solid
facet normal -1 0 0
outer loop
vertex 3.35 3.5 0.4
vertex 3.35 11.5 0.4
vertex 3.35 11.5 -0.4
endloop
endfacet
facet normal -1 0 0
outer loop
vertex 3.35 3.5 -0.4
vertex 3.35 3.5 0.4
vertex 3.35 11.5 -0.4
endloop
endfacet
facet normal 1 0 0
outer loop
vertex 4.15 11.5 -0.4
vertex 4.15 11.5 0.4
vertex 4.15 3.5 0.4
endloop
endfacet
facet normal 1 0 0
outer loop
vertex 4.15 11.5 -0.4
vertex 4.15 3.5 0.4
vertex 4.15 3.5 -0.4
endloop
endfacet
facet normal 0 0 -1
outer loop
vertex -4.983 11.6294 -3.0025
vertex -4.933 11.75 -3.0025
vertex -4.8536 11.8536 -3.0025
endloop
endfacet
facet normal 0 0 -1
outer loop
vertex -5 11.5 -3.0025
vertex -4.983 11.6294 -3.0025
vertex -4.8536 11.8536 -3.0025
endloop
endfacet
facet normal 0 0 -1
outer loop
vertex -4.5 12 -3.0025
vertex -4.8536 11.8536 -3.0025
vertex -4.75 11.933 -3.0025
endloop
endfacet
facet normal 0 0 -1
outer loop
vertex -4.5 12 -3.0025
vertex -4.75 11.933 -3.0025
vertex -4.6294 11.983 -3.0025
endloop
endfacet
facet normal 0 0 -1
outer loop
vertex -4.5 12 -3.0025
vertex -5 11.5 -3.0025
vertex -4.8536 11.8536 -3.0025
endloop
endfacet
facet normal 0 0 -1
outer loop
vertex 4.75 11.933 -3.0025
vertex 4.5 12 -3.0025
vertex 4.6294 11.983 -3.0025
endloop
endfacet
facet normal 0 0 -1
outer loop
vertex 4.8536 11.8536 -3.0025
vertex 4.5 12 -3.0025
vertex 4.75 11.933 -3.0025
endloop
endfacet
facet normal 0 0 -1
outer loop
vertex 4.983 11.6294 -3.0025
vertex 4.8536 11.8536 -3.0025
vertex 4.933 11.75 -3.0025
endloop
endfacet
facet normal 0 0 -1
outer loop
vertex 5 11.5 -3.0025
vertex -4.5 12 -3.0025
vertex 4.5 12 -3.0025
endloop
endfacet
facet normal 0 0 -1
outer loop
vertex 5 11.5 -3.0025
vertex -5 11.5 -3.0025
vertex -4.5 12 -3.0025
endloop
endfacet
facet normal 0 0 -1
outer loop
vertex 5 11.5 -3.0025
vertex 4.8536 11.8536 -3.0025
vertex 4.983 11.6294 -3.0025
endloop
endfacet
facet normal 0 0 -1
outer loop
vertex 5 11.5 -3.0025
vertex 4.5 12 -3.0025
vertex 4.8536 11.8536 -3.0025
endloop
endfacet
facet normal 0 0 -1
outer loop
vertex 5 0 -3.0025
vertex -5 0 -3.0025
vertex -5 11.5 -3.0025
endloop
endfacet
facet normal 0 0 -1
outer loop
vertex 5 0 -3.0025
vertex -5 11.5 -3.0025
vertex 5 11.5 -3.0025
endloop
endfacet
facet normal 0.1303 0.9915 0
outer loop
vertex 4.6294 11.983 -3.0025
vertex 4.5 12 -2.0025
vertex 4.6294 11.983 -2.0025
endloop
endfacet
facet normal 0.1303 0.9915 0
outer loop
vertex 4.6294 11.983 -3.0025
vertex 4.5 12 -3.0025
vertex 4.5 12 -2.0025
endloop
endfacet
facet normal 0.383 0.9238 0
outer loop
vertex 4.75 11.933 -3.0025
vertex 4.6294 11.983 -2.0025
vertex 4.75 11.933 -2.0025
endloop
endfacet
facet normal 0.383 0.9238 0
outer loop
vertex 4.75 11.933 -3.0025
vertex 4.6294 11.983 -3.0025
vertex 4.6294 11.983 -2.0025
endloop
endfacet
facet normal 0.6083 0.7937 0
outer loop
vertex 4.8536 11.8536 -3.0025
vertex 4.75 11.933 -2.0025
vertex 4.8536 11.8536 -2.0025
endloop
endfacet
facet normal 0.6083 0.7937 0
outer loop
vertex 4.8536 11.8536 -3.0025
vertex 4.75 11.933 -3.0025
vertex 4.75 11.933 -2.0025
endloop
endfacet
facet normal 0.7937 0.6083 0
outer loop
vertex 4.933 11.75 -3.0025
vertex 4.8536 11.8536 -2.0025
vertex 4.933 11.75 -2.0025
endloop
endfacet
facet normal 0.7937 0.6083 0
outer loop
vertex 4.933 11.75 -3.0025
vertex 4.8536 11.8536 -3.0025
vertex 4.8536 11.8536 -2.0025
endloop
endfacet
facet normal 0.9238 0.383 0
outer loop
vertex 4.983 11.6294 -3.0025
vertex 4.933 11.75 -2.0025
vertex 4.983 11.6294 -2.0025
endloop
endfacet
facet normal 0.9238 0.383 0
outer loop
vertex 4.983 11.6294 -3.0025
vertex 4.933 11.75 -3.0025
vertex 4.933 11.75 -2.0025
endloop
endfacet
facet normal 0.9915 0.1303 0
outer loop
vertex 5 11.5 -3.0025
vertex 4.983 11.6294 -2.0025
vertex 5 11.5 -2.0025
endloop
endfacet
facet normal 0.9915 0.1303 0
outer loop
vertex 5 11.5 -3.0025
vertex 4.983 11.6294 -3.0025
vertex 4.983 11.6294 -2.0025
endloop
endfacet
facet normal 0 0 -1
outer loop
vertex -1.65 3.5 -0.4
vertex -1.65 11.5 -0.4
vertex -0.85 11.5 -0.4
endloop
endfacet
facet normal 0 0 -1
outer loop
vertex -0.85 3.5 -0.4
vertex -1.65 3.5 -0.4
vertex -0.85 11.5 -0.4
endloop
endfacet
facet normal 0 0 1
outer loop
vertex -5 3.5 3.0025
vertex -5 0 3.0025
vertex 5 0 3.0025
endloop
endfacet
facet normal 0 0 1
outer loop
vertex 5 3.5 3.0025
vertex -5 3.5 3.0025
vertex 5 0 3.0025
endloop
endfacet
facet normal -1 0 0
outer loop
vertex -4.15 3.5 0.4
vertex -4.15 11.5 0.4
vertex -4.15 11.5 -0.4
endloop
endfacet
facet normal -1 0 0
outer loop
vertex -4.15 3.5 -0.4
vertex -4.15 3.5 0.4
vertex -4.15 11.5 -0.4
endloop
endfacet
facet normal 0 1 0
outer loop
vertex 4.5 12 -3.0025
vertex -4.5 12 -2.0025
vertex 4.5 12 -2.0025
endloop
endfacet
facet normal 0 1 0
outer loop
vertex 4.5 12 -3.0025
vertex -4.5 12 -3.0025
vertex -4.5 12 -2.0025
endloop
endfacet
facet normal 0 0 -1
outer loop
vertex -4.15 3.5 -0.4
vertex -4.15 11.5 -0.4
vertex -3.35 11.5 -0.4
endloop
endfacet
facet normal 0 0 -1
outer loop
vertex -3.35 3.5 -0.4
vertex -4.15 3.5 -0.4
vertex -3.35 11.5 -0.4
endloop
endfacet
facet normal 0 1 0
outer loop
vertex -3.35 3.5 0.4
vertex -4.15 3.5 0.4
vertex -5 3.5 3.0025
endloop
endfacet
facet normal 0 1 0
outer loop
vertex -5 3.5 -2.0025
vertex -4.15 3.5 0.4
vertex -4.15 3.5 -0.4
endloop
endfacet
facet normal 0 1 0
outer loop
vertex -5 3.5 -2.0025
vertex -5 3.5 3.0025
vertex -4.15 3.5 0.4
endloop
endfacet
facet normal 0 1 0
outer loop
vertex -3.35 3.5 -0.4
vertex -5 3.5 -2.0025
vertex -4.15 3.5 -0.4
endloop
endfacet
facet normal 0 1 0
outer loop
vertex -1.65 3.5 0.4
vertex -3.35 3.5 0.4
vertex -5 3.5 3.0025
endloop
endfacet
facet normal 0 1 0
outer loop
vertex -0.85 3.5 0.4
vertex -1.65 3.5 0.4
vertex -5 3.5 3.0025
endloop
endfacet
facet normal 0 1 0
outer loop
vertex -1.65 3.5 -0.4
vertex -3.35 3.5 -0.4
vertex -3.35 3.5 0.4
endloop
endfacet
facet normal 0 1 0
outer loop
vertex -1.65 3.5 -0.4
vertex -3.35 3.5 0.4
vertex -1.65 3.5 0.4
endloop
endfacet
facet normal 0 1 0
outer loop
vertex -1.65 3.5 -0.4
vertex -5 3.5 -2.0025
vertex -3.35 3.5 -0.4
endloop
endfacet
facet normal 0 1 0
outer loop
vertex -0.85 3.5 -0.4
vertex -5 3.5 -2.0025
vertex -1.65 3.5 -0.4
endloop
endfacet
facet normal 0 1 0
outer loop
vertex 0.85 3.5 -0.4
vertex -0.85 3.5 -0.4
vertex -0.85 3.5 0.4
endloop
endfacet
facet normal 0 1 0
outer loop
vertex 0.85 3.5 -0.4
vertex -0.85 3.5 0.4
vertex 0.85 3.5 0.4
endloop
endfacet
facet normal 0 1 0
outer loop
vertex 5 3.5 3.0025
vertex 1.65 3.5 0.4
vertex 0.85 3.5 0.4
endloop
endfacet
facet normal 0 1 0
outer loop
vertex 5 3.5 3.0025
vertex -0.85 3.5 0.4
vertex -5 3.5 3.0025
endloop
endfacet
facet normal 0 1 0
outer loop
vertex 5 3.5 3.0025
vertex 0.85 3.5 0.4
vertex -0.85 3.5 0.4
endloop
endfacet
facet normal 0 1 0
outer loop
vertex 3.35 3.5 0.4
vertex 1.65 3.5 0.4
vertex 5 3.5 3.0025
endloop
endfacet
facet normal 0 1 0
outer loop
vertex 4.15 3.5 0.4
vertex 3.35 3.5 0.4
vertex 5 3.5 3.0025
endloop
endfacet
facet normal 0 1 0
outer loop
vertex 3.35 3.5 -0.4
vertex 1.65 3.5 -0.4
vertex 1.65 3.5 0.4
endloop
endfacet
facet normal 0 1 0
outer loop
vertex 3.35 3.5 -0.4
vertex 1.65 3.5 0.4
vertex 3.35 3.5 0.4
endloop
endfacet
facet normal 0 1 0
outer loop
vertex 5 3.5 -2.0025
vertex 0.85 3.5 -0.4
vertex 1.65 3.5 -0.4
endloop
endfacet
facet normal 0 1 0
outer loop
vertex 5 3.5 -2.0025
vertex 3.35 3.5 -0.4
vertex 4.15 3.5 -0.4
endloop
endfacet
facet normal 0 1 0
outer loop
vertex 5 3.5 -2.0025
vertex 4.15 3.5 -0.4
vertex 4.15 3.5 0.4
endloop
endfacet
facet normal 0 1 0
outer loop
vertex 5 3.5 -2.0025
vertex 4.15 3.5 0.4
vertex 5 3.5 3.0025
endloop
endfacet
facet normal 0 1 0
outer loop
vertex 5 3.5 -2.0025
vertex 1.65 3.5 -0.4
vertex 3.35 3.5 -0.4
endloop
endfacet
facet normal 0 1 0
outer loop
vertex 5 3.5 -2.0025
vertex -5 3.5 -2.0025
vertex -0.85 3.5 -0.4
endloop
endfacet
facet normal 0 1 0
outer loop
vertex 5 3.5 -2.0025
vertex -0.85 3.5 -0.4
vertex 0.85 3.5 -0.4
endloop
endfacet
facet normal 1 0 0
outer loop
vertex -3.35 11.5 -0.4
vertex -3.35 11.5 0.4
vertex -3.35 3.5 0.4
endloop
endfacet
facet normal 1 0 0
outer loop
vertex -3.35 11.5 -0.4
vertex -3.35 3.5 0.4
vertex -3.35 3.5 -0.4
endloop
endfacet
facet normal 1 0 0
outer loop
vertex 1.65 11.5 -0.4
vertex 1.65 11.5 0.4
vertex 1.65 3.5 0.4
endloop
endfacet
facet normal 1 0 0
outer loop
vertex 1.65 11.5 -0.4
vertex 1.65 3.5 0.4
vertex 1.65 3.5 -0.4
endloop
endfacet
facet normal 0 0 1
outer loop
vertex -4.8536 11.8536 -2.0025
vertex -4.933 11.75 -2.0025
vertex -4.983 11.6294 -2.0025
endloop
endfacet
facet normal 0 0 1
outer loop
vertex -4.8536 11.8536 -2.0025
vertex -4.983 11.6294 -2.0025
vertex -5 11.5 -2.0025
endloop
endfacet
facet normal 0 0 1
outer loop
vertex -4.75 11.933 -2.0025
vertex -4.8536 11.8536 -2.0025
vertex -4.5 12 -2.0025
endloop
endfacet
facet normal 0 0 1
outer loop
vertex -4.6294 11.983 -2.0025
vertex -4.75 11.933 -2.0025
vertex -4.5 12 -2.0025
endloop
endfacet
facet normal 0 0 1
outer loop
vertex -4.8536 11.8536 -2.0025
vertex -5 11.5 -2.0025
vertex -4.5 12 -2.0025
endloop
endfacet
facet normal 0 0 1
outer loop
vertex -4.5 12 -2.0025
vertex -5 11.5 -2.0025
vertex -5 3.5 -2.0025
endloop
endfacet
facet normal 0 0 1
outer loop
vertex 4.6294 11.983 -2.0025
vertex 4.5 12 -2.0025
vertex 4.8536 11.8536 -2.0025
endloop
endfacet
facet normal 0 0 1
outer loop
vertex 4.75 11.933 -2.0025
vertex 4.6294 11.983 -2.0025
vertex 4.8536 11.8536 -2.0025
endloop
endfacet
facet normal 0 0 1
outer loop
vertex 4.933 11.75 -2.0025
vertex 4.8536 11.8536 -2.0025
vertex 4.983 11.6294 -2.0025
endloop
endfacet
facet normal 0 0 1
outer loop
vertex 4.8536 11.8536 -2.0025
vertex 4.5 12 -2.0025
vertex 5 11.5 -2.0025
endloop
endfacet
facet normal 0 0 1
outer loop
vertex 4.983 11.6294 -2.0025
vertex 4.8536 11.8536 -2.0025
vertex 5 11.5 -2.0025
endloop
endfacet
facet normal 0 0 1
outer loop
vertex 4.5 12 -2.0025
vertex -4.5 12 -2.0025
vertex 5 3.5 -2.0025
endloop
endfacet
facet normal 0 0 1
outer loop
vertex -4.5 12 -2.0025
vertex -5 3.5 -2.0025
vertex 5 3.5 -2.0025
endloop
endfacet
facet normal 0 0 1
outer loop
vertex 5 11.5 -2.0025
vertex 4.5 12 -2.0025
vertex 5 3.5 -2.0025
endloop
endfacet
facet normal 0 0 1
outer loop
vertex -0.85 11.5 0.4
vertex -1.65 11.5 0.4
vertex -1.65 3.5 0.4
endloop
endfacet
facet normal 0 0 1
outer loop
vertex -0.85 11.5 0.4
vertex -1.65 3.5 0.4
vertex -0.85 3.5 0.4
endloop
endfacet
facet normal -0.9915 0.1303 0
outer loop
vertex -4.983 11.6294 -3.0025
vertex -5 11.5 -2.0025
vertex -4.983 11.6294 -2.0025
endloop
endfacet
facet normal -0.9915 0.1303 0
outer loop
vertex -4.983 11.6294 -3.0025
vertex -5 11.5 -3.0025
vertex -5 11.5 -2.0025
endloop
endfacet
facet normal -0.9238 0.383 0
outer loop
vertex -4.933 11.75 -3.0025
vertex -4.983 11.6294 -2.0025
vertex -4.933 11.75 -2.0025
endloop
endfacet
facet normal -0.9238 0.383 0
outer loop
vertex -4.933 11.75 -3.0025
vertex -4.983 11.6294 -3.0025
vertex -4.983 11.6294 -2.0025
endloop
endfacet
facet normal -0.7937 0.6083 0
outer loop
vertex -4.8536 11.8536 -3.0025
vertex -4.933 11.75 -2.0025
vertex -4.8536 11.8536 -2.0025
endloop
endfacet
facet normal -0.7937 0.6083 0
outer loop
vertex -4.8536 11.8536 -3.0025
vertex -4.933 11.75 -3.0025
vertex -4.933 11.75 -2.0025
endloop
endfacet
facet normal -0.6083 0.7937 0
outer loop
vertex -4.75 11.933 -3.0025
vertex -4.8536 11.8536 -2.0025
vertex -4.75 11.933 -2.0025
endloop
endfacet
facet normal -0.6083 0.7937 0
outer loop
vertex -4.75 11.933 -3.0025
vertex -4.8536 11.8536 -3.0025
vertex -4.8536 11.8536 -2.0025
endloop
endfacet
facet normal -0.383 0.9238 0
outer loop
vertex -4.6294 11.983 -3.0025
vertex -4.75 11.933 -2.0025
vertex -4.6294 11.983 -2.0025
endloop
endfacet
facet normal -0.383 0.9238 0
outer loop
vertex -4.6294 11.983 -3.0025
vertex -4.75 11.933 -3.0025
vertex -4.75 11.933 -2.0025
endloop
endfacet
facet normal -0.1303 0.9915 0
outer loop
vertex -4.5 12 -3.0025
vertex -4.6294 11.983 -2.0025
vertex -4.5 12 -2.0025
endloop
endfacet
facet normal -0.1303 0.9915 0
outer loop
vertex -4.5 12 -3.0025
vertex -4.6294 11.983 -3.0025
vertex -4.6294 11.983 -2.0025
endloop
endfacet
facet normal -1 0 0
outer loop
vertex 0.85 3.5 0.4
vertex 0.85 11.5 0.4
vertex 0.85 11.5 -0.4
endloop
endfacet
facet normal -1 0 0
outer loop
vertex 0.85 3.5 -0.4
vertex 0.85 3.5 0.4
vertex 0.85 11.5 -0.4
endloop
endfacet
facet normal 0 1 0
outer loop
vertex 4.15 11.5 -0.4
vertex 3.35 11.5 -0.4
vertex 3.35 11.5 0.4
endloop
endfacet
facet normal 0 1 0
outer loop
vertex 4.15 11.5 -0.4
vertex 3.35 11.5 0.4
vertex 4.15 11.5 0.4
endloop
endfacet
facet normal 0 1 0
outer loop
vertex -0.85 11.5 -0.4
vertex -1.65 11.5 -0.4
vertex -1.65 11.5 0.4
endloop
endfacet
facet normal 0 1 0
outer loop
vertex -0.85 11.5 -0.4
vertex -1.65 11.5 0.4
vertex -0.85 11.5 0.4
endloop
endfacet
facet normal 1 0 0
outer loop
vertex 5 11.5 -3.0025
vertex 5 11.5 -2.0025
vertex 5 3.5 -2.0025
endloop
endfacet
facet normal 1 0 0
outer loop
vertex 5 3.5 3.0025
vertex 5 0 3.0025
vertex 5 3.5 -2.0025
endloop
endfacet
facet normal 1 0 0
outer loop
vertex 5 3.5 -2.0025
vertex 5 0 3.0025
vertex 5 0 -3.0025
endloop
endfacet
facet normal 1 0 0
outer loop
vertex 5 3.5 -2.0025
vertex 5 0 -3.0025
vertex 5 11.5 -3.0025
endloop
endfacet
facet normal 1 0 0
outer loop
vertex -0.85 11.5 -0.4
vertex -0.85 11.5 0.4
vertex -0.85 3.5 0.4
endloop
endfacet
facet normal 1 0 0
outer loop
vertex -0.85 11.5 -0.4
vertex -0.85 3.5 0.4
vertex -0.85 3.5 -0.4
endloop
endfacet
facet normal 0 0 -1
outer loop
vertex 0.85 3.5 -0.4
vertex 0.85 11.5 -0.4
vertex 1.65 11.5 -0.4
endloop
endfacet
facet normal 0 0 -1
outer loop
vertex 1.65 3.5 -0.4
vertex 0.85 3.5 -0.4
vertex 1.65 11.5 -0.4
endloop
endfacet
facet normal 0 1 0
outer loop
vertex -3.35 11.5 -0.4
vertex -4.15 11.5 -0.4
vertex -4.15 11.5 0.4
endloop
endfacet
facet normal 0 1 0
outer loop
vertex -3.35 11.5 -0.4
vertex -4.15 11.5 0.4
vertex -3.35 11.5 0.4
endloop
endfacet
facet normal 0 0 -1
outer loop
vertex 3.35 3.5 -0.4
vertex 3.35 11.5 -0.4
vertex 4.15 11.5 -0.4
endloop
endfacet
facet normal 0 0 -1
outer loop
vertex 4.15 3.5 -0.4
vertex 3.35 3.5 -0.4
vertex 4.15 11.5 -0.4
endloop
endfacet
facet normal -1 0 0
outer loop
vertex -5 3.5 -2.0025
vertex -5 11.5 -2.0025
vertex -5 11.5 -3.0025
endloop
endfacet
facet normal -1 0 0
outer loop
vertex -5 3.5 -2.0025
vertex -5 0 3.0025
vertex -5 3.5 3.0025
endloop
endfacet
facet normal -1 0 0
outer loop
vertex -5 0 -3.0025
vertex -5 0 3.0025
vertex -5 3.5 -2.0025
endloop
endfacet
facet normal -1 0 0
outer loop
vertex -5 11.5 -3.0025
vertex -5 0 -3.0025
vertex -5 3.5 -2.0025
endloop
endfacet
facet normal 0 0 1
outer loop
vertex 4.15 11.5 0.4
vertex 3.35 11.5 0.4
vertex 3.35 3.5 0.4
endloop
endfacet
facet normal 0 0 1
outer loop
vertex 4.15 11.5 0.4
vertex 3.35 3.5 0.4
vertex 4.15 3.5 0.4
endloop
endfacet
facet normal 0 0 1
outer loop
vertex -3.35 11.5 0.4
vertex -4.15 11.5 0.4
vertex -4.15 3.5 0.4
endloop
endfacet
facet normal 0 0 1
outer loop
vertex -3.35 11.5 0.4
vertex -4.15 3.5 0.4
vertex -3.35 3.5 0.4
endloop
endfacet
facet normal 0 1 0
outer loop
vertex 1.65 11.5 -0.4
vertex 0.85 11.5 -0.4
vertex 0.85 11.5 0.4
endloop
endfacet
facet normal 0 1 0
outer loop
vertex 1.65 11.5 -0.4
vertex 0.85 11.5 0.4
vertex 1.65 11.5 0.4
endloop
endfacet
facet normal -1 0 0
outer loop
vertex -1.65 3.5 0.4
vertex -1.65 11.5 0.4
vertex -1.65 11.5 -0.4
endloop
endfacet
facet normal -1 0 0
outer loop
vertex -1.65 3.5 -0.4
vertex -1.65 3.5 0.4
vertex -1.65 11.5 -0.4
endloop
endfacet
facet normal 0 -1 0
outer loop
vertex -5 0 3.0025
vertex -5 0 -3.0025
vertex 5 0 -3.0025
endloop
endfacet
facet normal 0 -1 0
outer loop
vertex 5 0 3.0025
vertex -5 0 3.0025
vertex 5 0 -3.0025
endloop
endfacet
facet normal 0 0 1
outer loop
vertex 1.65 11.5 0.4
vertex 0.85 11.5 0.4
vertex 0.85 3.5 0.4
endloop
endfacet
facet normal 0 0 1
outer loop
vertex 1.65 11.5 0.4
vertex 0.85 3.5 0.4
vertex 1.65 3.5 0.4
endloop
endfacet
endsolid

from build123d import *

# Parameters (mm, degrees)
ESBO_O1_W                = 10
ESBO_O1_H                = 6.00490196
RESSALTO_EXTRUS_O1_DEPTH = 3.5
ESBO_O2_W                = 10
ESBO_O2_H                = 1
RESSALTO_EXTRUS_O2_DEPTH = 8.5
ESBO_O3_W                = 0.8
ESBO_O3_H                = 0.8
RESSALTO_EXTRUS_O3_DEPTH = 8
FILETE1_R                = 0.5


with BuildPart() as part:
    # Esboço1 → Ressalto-extrusão1 (new body)
    with BuildSketch(Plane(origin=(0, 0, 0), x_dir=(1, 0, 0), z_dir=(0, 1, 0))):
        Rectangle(ESBO_O1_W, ESBO_O1_H)
    extrude(amount=RESSALTO_EXTRUS_O1_DEPTH)

    # Esboço2 → Ressalto-extrusão2 (add)
    with BuildSketch(Plane(origin=(0, 3.5, 0), x_dir=(1, 0, 0), z_dir=(0, 1, 0))):
        with Locations((0, 2.50245098)):
            Rectangle(ESBO_O2_W, ESBO_O2_H)
    extrude(amount=RESSALTO_EXTRUS_O2_DEPTH)

    # Esboço3 → Ressalto-extrusão3 (add)
    with BuildSketch(Plane(origin=(0, 3.5, 0), x_dir=(1, 0, 0), z_dir=(0, 1, 0))):
        with Locations((-3.75, 0)):
            Rectangle(ESBO_O3_W, ESBO_O3_H)
        with Locations((-1.25, 0)):
            Rectangle(ESBO_O3_W, ESBO_O3_H)
        with Locations((1.25, 0)):
            Rectangle(ESBO_O3_W, ESBO_O3_H)
        with Locations((3.75, 0)):
            Rectangle(ESBO_O3_W, ESBO_O3_H)
    extrude(amount=RESSALTO_EXTRUS_O3_DEPTH)

    # Filete1
    filete1_edges = [part.edges().sort_by_distance(p)[0] for p in [
        (-5, 12, -2.50245098),
        (5, 12, -2.50245098),
    ]]
    fillet(filete1_edges, radius=FILETE1_R)


solid = part.part
